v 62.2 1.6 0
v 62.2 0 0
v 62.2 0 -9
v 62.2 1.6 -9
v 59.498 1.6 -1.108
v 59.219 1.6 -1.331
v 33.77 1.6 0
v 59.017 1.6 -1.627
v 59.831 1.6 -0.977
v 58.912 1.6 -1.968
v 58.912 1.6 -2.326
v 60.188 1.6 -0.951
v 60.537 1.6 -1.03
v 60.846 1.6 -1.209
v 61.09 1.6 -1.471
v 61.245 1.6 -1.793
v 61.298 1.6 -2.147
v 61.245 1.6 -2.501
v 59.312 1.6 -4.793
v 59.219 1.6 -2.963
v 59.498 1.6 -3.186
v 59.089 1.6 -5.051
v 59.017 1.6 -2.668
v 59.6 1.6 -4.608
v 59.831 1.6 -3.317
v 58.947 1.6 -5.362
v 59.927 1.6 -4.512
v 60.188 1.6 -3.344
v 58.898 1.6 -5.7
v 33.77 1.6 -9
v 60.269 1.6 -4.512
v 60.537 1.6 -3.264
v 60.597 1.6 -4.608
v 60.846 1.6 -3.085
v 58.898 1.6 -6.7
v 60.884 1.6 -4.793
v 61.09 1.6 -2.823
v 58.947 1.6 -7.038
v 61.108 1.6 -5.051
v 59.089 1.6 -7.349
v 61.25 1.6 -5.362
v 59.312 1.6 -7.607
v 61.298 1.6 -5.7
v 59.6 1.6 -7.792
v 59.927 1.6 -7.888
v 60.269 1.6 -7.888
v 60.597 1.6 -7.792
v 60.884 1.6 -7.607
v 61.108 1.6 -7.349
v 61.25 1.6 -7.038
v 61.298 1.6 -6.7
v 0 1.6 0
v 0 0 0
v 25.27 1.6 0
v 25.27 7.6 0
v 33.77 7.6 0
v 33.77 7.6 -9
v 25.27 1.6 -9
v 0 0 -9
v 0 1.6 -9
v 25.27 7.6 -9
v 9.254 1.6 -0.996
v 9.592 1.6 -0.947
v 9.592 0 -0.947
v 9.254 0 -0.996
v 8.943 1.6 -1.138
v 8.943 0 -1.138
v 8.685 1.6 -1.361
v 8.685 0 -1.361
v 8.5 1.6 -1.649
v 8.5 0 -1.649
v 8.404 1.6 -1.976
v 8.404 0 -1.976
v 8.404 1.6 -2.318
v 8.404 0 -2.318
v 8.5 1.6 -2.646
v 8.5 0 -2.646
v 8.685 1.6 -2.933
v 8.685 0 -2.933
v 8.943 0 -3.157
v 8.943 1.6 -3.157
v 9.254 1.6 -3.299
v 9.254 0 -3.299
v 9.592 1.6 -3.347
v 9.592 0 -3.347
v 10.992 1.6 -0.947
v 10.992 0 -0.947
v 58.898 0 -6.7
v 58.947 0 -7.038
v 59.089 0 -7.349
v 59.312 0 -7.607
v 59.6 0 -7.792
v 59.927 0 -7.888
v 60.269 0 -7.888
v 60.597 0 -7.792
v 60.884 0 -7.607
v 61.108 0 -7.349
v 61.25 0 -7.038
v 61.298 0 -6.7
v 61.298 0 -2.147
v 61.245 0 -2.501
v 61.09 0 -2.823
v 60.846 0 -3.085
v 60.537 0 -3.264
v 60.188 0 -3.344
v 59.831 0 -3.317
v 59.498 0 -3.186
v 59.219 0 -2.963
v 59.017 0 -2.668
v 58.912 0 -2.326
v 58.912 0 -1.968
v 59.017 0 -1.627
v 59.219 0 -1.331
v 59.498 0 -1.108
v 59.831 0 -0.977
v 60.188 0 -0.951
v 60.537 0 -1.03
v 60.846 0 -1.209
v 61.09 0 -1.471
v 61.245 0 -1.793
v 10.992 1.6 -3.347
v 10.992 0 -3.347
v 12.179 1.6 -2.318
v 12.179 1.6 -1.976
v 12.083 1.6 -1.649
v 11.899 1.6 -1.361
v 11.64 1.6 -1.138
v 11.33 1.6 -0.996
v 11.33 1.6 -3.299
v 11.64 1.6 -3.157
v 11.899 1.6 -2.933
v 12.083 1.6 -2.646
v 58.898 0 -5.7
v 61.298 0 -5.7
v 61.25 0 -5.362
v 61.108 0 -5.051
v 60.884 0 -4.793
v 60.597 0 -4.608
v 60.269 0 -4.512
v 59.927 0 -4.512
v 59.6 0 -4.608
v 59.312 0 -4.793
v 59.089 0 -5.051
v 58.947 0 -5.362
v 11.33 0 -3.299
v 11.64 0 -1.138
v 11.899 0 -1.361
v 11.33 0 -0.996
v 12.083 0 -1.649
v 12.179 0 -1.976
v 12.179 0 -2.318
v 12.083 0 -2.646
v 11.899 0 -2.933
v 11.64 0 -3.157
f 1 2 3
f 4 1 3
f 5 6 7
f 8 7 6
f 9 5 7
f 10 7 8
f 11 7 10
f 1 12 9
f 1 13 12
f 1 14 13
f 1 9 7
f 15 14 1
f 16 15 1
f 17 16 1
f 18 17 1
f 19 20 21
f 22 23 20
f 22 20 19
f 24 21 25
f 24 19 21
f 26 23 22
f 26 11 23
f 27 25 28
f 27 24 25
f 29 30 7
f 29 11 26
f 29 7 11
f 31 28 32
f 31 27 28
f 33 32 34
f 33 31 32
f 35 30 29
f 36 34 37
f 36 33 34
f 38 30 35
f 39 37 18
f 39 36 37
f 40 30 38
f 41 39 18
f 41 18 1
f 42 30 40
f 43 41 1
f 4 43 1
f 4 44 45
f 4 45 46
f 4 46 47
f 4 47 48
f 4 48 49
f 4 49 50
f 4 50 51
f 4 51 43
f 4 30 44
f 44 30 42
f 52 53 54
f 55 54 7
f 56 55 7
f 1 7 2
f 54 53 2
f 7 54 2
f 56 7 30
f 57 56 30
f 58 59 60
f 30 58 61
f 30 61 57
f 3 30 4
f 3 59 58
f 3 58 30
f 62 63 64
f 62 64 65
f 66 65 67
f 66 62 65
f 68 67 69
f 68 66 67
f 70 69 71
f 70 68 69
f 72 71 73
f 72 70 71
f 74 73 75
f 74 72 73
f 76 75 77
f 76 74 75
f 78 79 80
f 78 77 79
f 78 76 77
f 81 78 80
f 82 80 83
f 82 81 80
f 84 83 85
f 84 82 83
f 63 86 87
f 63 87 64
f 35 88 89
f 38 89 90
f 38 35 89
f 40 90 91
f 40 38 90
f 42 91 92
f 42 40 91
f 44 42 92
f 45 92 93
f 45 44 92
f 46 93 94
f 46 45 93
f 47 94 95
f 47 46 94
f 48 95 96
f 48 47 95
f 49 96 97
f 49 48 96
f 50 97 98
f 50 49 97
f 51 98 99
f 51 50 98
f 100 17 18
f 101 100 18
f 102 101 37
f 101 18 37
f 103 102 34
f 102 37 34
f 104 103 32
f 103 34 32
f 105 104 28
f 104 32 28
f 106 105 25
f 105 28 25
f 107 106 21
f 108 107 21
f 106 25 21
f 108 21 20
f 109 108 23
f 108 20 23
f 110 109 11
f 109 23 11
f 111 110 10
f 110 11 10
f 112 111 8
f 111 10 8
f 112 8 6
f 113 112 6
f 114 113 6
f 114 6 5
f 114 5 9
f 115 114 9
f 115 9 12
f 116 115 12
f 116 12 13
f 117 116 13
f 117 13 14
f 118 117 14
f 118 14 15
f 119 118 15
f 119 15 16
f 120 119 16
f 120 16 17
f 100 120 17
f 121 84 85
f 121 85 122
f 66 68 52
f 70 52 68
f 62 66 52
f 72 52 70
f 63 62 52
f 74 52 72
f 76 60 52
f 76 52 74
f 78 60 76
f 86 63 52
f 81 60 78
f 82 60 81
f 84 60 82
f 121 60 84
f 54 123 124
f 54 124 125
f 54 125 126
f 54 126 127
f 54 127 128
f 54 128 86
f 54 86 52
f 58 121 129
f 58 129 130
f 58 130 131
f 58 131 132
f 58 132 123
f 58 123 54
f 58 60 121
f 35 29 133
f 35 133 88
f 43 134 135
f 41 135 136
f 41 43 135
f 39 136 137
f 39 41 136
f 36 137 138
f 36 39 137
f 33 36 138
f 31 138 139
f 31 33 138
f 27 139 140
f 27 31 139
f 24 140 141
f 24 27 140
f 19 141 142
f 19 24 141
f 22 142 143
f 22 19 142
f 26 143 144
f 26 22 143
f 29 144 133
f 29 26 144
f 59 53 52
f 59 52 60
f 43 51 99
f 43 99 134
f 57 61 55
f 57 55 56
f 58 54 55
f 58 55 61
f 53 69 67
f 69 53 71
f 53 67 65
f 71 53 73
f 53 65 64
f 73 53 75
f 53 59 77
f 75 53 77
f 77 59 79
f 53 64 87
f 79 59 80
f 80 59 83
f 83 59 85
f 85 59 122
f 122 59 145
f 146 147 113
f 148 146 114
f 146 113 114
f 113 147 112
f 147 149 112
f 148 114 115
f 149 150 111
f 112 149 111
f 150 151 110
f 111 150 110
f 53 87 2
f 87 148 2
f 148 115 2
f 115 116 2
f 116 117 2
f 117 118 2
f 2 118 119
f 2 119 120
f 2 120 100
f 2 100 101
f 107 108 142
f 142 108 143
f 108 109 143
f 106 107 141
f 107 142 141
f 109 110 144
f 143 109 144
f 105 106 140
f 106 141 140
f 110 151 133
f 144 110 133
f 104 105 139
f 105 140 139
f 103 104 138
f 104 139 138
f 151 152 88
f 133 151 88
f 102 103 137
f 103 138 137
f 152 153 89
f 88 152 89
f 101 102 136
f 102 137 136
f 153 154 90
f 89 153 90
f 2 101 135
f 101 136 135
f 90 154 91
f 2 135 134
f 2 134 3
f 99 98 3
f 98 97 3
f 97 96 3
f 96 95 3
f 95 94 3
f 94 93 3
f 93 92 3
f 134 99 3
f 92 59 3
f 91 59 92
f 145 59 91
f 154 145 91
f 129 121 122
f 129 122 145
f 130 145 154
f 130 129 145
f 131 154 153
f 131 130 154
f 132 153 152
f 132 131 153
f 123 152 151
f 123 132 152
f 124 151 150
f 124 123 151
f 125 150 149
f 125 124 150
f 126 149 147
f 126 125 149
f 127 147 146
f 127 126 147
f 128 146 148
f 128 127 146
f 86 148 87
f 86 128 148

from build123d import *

# Parameters (mm, degrees)
SKETCH1_W           = 62.2
SKETCH1_H           = 9
BOSS_EXTRUDE1_DEPTH = 1.6
SKETCH2_R           = 1.2
CUT_EXTRUDE1_DEPTH  = 2.6
SKETCH3_W           = 8.5
SKETCH3_H           = 9
BOSS_EXTRUDE2_DEPTH = 6


with BuildPart() as part:
    # Sketch1 → Boss-Extrude1 (new body)
    with BuildSketch(Plane(origin=(0, 0, 0), x_dir=(1, 0, 0), z_dir=(0, 1, 0))):
        with Locations((31.1, 4.5)):
            Rectangle(SKETCH1_W, SKETCH1_H)
    extrude(amount=BOSS_EXTRUDE1_DEPTH)

    # Sketch2 → Cut-Extrude1 (cut, through all)
    with BuildSketch(Plane(origin=(0, 1.6, 0), x_dir=(1, 0, 0), z_dir=(0, 1, 0))):
        with Locations((60.098236825, 2.147164508)):
            Circle(SKETCH2_R)
        with BuildLine():
            Line((9.591628176, 3.347164508), (10.991628176, 3.347164508))
            ThreePointArc((10.991628176, 3.347164508), (12.191628176, 2.147164508), (10.991628176, 0.947164508))
            Line((10.991628176, 0.947164508), (9.591628176, 0.947164508))
            ThreePointArc((9.591628176, 0.947164508), (8.391628176, 2.147164508), (9.591628176, 3.347164508))
        make_face()
        with BuildLine():
            Line((61.298236825, 6.7), (61.298236825, 5.7))
            ThreePointArc((61.298236825, 5.7), (60.098236825, 4.5), (58.898236825, 5.7))
            Line((58.898236825, 5.7), (58.898236825, 6.7))
            ThreePointArc((58.898236825, 6.7), (60.098236825, 7.9), (61.298236825, 6.7))
        make_face()
    extrude(amount=-CUT_EXTRUDE1_DEPTH, mode=Mode.SUBTRACT)

    # Sketch3 → Boss-Extrude2 (add)
    with BuildSketch(Plane(origin=(0, 1.6, 0), x_dir=(1, 0, 0), z_dir=(0, 1, 0))):
        with Locations((29.52, 4.5)):
            Rectangle(SKETCH3_W, SKETCH3_H)
    extrude(amount=BOSS_EXTRUDE2_DEPTH)


solid = part.part
